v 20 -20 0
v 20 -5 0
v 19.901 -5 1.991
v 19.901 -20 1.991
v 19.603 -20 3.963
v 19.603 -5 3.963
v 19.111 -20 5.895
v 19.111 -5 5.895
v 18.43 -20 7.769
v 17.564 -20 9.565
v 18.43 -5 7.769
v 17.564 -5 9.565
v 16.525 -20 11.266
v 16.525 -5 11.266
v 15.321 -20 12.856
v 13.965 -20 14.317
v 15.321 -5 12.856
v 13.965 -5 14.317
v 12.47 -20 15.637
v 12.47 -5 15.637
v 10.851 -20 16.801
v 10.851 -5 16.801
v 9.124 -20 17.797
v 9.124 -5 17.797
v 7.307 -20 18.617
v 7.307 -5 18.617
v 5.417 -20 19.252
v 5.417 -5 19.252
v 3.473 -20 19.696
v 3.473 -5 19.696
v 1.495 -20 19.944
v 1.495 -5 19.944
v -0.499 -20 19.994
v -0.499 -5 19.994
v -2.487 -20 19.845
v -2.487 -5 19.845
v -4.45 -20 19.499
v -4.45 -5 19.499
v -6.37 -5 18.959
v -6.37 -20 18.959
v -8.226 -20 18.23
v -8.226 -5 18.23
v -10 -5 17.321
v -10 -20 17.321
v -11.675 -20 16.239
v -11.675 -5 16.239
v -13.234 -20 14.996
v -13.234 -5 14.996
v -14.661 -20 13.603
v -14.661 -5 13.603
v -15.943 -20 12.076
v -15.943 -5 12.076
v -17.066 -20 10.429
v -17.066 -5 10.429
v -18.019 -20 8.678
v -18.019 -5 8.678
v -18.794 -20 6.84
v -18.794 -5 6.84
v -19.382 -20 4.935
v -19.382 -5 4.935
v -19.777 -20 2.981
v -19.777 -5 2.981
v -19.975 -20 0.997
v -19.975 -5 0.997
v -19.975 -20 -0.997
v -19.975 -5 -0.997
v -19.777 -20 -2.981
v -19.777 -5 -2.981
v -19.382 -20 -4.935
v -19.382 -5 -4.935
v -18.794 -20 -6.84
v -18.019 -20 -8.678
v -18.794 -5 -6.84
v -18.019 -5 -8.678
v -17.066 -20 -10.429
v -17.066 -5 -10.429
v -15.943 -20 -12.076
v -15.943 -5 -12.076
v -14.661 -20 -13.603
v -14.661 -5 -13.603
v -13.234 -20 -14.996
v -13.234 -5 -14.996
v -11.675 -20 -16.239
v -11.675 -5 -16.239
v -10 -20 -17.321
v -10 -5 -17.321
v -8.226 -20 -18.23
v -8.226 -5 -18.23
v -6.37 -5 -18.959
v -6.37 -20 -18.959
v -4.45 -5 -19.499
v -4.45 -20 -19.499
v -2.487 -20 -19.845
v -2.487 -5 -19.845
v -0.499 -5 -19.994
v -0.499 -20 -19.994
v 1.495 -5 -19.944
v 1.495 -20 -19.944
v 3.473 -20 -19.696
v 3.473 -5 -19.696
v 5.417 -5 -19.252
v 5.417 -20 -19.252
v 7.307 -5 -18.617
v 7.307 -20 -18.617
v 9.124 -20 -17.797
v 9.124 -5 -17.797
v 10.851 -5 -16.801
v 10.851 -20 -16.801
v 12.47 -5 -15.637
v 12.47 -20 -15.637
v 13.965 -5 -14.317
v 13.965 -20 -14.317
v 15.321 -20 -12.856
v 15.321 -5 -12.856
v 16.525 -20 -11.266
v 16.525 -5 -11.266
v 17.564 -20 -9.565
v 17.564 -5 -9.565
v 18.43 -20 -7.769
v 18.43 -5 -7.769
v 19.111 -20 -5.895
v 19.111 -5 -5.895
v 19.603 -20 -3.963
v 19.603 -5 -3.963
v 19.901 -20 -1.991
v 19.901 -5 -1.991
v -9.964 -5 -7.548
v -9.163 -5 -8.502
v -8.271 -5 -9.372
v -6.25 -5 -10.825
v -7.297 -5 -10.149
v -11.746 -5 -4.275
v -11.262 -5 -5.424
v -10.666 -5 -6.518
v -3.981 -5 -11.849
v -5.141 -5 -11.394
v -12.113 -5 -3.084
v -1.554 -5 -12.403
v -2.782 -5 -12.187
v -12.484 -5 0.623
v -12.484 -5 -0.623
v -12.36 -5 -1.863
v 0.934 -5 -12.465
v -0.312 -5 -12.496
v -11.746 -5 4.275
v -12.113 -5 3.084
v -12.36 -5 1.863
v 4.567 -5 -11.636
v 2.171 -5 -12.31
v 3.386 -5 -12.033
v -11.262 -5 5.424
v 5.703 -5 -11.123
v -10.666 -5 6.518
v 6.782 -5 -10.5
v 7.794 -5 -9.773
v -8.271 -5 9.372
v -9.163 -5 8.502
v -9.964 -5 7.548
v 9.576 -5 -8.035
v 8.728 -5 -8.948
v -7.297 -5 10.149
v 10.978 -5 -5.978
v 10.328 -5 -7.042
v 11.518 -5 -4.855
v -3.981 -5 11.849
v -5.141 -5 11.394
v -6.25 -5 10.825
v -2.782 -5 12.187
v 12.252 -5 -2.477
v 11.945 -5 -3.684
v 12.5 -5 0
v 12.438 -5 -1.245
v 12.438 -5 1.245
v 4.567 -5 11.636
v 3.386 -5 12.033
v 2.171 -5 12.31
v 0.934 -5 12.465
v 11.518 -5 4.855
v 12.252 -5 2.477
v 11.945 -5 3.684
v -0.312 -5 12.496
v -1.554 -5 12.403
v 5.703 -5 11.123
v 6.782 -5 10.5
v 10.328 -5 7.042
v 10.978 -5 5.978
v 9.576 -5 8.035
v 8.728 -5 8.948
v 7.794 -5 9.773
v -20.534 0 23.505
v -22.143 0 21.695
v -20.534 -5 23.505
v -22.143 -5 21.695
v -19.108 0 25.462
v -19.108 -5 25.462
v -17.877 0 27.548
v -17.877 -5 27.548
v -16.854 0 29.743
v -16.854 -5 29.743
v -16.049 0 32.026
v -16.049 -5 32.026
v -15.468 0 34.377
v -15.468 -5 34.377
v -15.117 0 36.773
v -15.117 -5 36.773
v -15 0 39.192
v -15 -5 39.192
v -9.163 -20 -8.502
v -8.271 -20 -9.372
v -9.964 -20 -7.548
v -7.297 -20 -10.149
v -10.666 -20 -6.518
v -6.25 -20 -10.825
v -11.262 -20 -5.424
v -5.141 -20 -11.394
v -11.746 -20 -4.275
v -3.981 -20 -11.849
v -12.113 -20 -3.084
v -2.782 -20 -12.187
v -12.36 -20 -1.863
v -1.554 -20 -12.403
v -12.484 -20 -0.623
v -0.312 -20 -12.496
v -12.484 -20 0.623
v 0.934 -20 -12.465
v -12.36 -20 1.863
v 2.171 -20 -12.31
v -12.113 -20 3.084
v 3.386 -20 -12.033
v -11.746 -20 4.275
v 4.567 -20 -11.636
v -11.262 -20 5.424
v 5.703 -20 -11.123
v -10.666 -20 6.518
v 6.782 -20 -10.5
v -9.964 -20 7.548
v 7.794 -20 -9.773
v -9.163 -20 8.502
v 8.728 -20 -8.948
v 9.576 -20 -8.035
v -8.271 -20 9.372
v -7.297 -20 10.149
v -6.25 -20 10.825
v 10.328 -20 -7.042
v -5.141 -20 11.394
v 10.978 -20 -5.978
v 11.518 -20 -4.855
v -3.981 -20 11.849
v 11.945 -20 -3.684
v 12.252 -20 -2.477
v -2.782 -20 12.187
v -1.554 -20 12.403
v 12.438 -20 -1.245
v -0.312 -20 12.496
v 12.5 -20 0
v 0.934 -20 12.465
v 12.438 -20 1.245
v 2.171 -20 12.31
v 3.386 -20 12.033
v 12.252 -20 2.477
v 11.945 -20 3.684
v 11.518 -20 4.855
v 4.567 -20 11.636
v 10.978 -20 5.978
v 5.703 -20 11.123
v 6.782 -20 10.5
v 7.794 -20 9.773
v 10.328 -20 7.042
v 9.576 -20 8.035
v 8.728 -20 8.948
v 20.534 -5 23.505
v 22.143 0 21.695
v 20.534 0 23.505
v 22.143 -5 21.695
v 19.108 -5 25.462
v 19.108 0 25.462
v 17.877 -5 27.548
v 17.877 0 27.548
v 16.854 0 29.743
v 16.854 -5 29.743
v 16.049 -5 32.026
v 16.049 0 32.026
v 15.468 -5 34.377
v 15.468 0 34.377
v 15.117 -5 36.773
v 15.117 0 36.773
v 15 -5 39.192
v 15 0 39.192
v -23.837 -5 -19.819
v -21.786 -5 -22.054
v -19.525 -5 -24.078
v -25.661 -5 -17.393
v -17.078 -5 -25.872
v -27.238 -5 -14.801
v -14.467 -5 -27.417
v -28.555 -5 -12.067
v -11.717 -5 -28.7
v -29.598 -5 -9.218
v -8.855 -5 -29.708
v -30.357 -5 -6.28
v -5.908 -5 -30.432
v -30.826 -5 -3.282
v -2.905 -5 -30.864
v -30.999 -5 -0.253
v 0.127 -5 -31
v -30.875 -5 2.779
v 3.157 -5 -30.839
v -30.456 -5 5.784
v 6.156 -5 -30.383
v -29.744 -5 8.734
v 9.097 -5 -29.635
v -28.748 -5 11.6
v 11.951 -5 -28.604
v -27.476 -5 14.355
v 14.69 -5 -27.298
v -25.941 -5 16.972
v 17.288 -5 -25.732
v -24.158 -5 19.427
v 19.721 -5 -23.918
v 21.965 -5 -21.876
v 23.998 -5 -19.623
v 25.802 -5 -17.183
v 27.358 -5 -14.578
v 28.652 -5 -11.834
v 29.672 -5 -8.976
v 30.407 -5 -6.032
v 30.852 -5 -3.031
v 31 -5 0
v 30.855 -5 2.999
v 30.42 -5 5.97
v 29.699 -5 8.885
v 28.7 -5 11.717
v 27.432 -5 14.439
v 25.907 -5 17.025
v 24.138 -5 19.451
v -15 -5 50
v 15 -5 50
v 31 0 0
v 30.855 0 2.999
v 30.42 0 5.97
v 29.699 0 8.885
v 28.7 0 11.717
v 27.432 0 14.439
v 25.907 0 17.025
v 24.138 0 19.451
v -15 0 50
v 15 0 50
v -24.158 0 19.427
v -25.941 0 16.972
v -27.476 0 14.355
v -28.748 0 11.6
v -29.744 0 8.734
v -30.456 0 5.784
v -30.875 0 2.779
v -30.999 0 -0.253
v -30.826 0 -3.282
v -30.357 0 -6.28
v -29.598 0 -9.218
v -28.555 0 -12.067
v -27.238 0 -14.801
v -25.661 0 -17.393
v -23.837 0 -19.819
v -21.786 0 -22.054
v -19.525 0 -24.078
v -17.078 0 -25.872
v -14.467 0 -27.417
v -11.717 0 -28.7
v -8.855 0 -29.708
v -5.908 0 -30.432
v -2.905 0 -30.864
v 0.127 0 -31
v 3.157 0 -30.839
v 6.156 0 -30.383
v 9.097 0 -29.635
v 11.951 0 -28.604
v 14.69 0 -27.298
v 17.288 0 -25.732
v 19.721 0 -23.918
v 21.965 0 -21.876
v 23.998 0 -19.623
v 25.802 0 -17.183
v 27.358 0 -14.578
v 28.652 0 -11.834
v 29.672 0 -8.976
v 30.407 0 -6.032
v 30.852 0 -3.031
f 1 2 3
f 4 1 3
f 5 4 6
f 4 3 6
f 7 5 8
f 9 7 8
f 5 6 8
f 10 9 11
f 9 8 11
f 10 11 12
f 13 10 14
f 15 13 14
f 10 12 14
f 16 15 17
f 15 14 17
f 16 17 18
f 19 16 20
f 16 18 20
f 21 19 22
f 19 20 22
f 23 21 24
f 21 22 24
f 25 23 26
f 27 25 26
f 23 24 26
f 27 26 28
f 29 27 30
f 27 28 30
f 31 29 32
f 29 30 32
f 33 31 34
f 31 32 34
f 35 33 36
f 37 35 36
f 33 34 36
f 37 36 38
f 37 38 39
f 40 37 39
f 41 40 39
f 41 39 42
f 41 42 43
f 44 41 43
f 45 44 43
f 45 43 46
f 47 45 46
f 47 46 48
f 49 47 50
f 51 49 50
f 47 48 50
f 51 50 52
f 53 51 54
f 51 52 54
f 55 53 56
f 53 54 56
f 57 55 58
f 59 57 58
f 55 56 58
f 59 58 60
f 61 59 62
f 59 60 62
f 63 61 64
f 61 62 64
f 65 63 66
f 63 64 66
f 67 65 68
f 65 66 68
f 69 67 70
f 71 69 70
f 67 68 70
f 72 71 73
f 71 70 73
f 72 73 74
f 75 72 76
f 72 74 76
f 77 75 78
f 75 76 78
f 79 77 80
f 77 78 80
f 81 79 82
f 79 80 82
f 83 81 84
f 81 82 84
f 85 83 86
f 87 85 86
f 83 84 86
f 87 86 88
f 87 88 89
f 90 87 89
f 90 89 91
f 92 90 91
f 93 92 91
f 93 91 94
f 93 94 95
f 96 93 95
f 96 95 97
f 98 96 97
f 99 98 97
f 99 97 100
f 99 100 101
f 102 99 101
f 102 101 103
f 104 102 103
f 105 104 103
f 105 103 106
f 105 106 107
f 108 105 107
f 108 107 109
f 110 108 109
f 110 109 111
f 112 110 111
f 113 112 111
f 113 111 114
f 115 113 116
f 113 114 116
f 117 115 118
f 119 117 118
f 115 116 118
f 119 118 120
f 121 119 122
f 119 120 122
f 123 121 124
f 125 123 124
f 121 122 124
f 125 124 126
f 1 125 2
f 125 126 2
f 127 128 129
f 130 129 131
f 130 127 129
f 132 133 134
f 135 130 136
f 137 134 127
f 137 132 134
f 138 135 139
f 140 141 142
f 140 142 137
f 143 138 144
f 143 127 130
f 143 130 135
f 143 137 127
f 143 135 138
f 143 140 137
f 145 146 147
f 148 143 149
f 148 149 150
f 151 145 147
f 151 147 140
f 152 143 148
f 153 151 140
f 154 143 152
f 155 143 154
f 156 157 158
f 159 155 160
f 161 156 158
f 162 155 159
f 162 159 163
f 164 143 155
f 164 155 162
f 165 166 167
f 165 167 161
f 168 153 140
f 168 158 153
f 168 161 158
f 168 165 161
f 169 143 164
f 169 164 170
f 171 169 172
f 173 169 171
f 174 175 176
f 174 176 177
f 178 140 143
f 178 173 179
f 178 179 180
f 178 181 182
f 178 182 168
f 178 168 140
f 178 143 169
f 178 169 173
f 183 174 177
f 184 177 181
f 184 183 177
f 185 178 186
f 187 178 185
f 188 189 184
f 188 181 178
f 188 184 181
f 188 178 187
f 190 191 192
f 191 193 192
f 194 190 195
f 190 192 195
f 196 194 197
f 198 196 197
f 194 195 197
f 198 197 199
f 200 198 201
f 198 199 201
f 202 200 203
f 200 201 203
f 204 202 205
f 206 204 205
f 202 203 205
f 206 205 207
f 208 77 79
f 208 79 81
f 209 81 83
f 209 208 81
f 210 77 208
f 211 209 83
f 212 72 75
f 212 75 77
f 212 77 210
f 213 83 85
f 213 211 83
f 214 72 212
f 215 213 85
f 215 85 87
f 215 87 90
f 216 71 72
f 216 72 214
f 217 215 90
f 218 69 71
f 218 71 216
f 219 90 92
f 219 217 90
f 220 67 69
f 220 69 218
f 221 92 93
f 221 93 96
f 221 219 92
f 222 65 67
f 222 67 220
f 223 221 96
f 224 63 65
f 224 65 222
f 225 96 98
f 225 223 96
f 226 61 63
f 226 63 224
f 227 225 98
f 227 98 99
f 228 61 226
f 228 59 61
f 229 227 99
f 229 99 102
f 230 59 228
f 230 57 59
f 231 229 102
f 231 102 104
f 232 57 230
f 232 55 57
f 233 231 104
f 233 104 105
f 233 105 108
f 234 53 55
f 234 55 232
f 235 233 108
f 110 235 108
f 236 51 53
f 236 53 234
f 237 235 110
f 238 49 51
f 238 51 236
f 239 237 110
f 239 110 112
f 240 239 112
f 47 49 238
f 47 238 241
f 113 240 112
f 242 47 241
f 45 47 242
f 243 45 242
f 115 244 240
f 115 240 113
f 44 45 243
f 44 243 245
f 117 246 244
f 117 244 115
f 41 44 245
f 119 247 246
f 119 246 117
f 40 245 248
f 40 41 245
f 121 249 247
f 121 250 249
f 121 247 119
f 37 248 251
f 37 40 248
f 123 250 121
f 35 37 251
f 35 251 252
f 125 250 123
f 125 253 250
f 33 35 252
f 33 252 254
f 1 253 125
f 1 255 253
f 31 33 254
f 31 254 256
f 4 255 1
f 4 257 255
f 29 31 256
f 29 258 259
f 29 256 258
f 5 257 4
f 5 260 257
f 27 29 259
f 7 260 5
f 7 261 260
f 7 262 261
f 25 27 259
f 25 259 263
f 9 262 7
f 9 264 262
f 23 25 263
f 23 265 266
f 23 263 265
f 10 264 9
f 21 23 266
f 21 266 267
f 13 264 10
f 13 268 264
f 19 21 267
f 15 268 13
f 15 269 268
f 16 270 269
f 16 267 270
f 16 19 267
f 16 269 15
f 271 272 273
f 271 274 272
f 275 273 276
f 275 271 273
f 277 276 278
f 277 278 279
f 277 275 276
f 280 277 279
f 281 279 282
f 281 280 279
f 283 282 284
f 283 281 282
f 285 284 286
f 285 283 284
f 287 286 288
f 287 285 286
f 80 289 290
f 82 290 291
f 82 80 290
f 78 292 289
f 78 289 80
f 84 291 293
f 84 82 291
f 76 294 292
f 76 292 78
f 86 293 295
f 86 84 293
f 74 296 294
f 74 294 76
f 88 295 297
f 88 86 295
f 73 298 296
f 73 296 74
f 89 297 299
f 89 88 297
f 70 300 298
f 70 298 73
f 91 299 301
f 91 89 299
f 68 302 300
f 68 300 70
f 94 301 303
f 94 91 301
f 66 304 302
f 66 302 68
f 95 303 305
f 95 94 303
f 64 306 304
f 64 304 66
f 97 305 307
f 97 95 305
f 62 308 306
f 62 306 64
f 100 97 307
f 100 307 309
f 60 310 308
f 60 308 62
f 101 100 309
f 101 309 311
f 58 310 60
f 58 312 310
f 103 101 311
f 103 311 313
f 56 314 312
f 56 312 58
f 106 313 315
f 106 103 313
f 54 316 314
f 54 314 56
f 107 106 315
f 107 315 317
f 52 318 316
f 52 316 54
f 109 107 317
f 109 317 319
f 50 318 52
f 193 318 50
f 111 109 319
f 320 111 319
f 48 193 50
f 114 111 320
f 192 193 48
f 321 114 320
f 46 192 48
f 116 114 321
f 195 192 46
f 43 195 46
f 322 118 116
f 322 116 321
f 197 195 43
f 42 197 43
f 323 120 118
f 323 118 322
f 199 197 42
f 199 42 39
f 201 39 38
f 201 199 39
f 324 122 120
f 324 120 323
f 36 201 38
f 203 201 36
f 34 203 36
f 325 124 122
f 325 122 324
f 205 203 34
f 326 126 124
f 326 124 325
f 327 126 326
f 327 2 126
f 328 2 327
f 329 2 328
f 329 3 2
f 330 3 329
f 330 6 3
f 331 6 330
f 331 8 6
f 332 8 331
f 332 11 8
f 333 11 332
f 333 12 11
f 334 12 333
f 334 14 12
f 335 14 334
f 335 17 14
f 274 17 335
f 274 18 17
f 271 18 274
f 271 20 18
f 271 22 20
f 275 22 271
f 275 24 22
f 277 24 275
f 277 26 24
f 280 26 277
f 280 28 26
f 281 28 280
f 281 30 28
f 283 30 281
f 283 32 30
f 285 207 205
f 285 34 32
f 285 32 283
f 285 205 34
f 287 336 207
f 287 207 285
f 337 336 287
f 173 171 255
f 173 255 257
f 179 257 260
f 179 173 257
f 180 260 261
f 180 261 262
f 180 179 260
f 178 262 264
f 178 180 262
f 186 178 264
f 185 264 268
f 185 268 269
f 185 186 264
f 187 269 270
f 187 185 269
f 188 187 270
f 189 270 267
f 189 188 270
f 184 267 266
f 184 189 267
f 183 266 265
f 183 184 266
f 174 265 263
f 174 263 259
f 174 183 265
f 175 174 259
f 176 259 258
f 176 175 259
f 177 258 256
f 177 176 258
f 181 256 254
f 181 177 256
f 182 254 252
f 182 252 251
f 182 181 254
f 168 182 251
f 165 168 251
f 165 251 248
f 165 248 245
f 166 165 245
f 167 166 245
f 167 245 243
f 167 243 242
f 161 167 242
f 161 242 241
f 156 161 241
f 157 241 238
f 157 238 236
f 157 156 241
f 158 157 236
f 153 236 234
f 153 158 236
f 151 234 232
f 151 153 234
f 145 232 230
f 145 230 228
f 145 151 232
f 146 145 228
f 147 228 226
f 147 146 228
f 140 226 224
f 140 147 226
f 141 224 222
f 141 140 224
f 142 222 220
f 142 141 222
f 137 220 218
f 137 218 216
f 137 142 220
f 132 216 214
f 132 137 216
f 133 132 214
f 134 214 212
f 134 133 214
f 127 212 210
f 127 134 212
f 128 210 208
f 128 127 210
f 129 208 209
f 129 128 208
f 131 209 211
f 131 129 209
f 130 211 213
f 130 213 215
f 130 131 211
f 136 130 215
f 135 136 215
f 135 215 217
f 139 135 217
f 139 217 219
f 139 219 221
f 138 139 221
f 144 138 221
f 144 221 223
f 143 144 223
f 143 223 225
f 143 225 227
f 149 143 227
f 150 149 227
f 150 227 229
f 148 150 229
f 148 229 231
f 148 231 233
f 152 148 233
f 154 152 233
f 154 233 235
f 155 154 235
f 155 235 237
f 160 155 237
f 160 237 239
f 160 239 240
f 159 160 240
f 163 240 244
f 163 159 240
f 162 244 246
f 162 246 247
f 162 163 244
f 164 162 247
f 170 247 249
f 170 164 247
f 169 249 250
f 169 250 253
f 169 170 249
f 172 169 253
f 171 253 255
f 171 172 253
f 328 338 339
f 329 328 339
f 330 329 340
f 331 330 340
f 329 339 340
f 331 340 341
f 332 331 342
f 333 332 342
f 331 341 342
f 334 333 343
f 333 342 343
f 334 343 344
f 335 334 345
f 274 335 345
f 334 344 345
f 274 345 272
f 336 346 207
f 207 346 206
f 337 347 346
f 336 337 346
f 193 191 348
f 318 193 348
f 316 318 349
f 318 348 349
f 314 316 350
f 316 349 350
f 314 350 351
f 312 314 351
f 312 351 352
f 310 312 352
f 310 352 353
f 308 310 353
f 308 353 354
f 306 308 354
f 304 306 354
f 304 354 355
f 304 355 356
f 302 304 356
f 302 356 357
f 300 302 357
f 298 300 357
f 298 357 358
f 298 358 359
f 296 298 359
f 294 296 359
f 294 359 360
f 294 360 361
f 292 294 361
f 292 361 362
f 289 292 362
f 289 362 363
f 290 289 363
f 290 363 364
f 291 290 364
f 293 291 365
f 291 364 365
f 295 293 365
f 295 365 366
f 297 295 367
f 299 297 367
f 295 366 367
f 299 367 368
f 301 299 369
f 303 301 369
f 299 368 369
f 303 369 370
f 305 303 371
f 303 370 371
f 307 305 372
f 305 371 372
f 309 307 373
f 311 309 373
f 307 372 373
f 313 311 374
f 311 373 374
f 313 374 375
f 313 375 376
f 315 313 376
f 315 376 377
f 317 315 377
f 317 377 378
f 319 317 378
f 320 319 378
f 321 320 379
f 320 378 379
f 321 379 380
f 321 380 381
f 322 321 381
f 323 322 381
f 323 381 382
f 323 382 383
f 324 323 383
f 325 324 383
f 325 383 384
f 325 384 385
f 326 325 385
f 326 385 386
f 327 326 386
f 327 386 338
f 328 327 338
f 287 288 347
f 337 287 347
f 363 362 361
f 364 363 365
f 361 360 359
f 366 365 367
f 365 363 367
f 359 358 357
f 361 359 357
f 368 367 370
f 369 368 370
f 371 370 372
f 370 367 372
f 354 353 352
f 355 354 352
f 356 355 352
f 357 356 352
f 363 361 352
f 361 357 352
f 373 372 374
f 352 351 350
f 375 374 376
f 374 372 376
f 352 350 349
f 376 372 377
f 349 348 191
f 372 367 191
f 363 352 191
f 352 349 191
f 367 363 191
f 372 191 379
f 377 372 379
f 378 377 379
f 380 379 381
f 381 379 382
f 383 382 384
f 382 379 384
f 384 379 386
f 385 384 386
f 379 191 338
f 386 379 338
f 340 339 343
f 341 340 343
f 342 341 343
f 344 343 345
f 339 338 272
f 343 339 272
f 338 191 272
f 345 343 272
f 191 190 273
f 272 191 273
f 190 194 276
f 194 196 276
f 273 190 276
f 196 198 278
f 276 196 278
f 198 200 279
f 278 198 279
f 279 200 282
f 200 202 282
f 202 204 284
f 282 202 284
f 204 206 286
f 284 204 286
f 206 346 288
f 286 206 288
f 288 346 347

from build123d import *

# Parameters (mm, degrees)
F1_DEPTH = 5
F2_R     = 25
F3_R     = 20
F3_R_2   = 12.5
F4_DEPTH = 15


with BuildPart() as f1:
    # F0 (on Front) → F1 (new body)
    with BuildSketch(Plane.XZ):
        with BuildLine():
            Line((15, 0), (15, 27.12932))
            ThreePointArc((15, 27.12932), (0, 31), (-15, 27.12932))
            Line((-15, 27.12932), (-15, 0))
            Line((-15, 0), (0, 0))
            Line((0, 0), (15, 0))
        make_face()
        with BuildLine():
            ThreePointArc((-15, 27.12932), (-15.748016, -26.70206), (31, 0))
            ThreePointArc((31, 0), (26.70206, 15.748016), (15, 27.12932))
            Line((15, 27.12932), (15, 0))
            Line((15, 0), (0, 0))
            Line((0, 0), (-15, 0))
            Line((-15, 0), (-15, 27.12932))
        make_face()
        with BuildLine():
            ThreePointArc((-15, 27.12932), (0, 31), (15, 27.12932))
            Line((15, 27.12932), (15, 50))
            Line((15, 50), (-15, 50))
            Line((-15, 50), (-15, 27.12932))
        make_face()
    extrude(amount=F1_DEPTH)

    # F2
    f2_edges = [f1.edges().sort_by_distance(p)[0] for p in [
        (-15, -2.5, 27.12932),
        (15, -2.5, 27.12932),
    ]]
    fillet(f2_edges, radius=F2_R)

    # F3 (on face) → F4 (join)
    with BuildSketch(Plane.XZ.offset(5)):
        Circle(F3_R)
        Circle(F3_R_2, mode=Mode.SUBTRACT)
    extrude(amount=F4_DEPTH)


solid = f1.part
